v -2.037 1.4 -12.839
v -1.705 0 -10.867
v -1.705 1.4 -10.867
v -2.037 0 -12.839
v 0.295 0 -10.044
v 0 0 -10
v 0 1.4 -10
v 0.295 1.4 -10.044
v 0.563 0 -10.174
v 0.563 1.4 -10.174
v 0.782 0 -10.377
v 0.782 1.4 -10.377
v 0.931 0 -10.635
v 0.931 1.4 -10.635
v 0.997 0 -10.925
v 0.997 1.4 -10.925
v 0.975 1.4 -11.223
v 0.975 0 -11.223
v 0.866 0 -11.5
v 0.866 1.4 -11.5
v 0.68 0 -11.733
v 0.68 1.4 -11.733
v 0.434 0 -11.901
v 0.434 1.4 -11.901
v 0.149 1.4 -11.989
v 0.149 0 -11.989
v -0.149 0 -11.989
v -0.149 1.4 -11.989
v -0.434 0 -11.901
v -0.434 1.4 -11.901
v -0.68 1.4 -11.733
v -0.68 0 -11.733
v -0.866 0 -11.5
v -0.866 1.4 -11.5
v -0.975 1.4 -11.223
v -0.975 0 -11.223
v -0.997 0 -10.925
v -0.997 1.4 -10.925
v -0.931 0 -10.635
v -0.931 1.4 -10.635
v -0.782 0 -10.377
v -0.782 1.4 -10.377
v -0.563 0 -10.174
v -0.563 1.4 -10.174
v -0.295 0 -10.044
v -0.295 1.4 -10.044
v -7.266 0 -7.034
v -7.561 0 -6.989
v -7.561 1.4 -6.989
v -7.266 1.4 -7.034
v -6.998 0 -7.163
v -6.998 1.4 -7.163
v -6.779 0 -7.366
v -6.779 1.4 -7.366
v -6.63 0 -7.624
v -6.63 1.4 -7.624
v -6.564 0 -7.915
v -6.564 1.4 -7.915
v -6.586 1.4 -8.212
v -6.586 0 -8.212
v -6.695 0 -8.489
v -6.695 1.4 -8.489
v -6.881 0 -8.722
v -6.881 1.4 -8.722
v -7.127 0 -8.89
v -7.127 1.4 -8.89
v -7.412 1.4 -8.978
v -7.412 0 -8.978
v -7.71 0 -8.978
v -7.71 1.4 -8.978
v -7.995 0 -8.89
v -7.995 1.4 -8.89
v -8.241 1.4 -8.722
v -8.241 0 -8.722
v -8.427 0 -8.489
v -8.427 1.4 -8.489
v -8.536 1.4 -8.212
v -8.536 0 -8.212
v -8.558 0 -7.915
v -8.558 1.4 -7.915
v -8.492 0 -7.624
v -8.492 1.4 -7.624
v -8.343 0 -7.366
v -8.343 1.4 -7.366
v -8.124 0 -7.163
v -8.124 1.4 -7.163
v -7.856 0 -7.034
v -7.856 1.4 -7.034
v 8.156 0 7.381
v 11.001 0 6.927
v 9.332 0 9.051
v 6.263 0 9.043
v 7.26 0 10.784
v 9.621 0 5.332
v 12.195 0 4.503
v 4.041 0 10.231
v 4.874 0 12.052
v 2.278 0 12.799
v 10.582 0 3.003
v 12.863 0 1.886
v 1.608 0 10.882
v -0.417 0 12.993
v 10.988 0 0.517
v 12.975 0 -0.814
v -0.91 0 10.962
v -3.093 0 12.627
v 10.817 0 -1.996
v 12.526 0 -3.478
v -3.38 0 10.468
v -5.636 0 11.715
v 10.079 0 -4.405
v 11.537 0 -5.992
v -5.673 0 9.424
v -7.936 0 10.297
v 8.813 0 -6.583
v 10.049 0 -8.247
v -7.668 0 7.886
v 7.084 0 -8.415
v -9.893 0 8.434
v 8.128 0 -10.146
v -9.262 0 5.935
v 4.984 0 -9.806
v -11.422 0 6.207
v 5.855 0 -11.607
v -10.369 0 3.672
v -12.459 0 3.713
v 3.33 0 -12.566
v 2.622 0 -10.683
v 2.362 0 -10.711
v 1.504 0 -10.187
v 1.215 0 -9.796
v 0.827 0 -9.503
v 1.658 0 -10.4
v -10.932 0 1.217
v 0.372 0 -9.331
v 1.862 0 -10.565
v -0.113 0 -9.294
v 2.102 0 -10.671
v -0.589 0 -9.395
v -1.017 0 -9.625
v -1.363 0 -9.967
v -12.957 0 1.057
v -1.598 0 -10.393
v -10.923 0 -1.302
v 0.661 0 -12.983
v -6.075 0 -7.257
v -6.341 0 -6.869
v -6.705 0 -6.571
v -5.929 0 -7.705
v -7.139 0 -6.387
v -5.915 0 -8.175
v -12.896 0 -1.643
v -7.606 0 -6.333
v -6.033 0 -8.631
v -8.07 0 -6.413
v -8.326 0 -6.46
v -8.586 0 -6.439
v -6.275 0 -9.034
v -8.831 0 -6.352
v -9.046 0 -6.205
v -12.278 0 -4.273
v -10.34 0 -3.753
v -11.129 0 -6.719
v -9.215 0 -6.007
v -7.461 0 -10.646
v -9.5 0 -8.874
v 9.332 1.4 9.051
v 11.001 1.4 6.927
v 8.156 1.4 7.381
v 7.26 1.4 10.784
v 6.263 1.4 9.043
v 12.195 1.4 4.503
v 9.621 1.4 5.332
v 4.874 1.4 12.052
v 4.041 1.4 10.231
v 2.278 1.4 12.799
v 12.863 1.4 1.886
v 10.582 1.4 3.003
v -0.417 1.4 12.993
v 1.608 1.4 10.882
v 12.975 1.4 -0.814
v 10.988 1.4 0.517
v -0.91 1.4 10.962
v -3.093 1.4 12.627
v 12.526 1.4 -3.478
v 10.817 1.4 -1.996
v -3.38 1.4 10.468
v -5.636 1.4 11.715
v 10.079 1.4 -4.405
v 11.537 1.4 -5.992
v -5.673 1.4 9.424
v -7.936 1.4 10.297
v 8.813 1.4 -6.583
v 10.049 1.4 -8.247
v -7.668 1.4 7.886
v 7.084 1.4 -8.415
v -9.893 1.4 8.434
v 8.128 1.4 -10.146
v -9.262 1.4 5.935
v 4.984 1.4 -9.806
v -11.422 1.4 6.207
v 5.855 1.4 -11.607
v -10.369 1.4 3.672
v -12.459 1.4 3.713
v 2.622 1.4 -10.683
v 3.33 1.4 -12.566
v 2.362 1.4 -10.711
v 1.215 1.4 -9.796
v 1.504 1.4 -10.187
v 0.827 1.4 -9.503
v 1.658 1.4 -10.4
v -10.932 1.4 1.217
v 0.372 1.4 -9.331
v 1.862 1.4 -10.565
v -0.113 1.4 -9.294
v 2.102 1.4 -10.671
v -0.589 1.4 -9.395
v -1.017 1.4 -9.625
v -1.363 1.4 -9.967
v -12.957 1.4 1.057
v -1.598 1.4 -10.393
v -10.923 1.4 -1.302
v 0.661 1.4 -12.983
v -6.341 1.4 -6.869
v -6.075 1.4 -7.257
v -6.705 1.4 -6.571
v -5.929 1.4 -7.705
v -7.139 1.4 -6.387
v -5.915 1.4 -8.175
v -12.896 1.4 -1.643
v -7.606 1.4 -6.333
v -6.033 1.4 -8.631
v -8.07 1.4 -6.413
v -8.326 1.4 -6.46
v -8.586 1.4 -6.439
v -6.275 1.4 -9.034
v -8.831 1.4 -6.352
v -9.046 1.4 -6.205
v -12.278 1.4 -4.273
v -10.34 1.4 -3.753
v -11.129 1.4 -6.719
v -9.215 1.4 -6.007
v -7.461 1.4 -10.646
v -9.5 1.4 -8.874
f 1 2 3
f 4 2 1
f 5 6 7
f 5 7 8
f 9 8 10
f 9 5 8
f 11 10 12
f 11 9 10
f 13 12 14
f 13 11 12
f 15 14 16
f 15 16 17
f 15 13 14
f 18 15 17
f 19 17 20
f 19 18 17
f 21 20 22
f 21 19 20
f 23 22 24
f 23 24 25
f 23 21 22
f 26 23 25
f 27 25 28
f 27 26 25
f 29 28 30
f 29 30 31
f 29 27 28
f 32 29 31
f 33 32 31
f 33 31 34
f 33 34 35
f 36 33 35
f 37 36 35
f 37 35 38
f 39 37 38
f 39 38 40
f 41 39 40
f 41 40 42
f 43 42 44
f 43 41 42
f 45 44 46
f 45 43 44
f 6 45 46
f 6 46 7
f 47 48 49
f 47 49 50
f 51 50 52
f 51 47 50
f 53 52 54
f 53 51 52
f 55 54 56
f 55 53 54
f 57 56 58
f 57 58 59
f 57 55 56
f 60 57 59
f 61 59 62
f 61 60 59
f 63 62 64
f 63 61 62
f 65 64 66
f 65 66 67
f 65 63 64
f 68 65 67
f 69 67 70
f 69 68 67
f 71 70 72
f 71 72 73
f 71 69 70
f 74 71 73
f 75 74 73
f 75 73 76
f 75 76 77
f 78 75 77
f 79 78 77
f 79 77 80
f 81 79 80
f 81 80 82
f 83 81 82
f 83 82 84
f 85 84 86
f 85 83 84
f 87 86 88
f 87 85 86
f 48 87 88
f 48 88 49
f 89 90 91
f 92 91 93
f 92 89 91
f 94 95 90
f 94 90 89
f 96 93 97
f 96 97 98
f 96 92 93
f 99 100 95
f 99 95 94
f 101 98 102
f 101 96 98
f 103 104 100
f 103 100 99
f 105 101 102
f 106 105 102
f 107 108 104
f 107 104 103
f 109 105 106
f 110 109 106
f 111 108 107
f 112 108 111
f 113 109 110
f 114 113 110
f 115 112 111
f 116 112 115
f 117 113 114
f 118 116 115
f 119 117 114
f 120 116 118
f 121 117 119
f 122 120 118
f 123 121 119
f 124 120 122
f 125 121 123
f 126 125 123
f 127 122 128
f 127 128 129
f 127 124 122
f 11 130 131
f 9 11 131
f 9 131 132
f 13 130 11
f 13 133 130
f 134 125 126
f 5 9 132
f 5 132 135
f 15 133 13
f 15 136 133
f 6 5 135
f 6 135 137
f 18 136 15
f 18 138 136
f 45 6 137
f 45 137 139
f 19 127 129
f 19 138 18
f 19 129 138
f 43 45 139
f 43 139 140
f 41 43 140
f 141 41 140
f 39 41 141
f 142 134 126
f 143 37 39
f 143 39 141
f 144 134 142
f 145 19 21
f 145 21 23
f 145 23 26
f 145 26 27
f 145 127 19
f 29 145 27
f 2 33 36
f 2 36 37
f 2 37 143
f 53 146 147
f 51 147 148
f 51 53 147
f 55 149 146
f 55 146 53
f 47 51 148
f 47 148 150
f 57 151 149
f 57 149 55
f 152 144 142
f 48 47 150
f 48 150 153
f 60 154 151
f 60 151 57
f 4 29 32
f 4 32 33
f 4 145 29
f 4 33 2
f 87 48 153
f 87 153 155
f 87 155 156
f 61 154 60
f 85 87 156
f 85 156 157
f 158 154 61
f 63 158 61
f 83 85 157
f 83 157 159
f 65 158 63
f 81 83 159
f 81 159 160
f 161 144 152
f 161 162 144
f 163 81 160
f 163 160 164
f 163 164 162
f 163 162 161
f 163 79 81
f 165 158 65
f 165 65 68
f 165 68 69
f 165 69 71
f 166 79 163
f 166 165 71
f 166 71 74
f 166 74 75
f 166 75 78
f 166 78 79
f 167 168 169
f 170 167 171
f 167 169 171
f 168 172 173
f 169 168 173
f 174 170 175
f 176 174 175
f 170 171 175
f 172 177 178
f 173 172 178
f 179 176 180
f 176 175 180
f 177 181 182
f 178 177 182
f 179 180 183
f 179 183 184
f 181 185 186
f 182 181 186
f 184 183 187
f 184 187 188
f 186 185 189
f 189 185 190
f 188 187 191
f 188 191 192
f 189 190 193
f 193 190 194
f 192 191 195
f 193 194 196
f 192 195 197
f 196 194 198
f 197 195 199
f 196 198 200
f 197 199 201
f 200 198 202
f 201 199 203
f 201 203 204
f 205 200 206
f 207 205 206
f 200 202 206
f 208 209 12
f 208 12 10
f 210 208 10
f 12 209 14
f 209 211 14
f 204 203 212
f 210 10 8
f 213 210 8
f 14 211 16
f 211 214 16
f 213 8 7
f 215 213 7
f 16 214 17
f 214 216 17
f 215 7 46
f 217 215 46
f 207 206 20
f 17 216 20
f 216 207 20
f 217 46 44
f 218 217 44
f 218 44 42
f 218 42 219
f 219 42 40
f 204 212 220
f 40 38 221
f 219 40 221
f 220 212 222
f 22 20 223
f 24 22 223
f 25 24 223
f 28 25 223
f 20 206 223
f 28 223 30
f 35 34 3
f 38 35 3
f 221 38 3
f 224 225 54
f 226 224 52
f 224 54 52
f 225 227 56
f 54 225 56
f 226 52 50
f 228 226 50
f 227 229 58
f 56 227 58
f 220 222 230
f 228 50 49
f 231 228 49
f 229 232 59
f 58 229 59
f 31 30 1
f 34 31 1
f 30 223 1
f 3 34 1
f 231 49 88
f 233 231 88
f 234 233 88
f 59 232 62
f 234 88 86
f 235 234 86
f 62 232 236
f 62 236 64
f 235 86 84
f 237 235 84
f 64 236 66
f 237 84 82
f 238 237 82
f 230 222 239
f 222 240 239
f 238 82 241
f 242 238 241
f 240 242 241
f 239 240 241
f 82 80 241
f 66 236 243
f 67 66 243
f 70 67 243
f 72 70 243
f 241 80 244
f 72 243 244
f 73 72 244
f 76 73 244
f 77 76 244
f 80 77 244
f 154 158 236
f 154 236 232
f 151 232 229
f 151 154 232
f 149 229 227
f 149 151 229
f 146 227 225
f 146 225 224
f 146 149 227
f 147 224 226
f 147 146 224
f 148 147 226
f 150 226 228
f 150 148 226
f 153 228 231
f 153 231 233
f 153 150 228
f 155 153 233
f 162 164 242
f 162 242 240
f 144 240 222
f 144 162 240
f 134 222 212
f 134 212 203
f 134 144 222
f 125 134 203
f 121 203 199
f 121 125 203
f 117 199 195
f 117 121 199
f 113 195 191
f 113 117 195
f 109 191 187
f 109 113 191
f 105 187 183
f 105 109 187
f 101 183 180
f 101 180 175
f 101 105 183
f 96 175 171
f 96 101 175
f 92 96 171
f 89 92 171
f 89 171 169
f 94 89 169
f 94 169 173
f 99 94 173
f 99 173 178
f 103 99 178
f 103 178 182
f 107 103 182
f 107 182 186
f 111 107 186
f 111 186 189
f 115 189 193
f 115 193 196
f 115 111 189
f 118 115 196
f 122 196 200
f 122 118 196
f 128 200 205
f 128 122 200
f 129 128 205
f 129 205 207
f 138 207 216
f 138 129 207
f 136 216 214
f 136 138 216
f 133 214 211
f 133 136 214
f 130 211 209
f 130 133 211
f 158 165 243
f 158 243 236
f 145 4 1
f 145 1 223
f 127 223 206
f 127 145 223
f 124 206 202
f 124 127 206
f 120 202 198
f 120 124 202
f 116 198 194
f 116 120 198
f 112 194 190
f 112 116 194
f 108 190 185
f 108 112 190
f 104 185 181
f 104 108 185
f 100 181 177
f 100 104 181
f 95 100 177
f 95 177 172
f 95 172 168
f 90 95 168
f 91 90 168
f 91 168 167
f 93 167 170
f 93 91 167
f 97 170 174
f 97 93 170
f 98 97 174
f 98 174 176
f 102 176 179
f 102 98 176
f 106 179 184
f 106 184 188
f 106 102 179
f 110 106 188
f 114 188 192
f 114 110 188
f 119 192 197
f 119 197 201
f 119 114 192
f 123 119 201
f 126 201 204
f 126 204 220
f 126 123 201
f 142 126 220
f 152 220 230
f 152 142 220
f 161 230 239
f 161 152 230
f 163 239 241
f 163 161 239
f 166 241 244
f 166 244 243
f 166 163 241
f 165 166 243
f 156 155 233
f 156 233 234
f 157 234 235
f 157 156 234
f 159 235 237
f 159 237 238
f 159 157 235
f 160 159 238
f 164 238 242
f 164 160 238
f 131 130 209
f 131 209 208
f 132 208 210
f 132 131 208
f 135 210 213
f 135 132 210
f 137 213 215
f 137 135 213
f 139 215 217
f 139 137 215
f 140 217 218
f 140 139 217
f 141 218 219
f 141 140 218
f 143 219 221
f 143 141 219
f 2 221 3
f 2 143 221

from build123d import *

# Parameters (mm, degrees)
SKETCH_1_R      = 1
EXTRUDE_1_DEPTH = 1.4


with BuildPart() as part:
    # 草图1 → 拉伸1 (new body)
    with BuildSketch(Plane(origin=(0, 0, 0), x_dir=(1, 0, 0), z_dir=(0, 1, 0))):
        with BuildLine():
            Line((-1.704686201, 10.867108399), (-2.036847592, 12.839441261))
            ThreePointArc((-2.036847592, 12.839441261), (4.873981347, -12.051734557), (-7.461076693, 10.64576604))
            Line((-7.461076693, 10.64576604), (-6.275343529, 9.034382303))
            ThreePointArc((-6.275343529, 9.034382303), (-6.193868184, 7.053393202), (-8.070099598, 6.412525252))
            ThreePointArc((-8.070099598, 6.412525252), (-8.711183181, 6.403482512), (-9.215009926, 6.006961967))
            ThreePointArc((-9.215009926, 6.006961967), (4.041226825, -10.230761739), (2.62241687, 10.682833414))
            ThreePointArc((2.62241687, 10.682833414), (1.978707932, 10.625847197), (1.504258862, 10.187091336))
            ThreePointArc((1.504258862, 10.187091336), (-0.354469436, 9.32728764), (-1.704686201, 10.867108399))
        make_face()
        with Locations(Location((0, 11, 0), (0, 0, 270))):
            Circle(SKETCH_1_R, mode=Mode.SUBTRACT)
        with Locations(Location((-7.561124809, 7.98932986, 0), (0, 0, 270))):
            Circle(SKETCH_1_R, mode=Mode.SUBTRACT)
    extrude(amount=EXTRUDE_1_DEPTH)


solid = part.part
